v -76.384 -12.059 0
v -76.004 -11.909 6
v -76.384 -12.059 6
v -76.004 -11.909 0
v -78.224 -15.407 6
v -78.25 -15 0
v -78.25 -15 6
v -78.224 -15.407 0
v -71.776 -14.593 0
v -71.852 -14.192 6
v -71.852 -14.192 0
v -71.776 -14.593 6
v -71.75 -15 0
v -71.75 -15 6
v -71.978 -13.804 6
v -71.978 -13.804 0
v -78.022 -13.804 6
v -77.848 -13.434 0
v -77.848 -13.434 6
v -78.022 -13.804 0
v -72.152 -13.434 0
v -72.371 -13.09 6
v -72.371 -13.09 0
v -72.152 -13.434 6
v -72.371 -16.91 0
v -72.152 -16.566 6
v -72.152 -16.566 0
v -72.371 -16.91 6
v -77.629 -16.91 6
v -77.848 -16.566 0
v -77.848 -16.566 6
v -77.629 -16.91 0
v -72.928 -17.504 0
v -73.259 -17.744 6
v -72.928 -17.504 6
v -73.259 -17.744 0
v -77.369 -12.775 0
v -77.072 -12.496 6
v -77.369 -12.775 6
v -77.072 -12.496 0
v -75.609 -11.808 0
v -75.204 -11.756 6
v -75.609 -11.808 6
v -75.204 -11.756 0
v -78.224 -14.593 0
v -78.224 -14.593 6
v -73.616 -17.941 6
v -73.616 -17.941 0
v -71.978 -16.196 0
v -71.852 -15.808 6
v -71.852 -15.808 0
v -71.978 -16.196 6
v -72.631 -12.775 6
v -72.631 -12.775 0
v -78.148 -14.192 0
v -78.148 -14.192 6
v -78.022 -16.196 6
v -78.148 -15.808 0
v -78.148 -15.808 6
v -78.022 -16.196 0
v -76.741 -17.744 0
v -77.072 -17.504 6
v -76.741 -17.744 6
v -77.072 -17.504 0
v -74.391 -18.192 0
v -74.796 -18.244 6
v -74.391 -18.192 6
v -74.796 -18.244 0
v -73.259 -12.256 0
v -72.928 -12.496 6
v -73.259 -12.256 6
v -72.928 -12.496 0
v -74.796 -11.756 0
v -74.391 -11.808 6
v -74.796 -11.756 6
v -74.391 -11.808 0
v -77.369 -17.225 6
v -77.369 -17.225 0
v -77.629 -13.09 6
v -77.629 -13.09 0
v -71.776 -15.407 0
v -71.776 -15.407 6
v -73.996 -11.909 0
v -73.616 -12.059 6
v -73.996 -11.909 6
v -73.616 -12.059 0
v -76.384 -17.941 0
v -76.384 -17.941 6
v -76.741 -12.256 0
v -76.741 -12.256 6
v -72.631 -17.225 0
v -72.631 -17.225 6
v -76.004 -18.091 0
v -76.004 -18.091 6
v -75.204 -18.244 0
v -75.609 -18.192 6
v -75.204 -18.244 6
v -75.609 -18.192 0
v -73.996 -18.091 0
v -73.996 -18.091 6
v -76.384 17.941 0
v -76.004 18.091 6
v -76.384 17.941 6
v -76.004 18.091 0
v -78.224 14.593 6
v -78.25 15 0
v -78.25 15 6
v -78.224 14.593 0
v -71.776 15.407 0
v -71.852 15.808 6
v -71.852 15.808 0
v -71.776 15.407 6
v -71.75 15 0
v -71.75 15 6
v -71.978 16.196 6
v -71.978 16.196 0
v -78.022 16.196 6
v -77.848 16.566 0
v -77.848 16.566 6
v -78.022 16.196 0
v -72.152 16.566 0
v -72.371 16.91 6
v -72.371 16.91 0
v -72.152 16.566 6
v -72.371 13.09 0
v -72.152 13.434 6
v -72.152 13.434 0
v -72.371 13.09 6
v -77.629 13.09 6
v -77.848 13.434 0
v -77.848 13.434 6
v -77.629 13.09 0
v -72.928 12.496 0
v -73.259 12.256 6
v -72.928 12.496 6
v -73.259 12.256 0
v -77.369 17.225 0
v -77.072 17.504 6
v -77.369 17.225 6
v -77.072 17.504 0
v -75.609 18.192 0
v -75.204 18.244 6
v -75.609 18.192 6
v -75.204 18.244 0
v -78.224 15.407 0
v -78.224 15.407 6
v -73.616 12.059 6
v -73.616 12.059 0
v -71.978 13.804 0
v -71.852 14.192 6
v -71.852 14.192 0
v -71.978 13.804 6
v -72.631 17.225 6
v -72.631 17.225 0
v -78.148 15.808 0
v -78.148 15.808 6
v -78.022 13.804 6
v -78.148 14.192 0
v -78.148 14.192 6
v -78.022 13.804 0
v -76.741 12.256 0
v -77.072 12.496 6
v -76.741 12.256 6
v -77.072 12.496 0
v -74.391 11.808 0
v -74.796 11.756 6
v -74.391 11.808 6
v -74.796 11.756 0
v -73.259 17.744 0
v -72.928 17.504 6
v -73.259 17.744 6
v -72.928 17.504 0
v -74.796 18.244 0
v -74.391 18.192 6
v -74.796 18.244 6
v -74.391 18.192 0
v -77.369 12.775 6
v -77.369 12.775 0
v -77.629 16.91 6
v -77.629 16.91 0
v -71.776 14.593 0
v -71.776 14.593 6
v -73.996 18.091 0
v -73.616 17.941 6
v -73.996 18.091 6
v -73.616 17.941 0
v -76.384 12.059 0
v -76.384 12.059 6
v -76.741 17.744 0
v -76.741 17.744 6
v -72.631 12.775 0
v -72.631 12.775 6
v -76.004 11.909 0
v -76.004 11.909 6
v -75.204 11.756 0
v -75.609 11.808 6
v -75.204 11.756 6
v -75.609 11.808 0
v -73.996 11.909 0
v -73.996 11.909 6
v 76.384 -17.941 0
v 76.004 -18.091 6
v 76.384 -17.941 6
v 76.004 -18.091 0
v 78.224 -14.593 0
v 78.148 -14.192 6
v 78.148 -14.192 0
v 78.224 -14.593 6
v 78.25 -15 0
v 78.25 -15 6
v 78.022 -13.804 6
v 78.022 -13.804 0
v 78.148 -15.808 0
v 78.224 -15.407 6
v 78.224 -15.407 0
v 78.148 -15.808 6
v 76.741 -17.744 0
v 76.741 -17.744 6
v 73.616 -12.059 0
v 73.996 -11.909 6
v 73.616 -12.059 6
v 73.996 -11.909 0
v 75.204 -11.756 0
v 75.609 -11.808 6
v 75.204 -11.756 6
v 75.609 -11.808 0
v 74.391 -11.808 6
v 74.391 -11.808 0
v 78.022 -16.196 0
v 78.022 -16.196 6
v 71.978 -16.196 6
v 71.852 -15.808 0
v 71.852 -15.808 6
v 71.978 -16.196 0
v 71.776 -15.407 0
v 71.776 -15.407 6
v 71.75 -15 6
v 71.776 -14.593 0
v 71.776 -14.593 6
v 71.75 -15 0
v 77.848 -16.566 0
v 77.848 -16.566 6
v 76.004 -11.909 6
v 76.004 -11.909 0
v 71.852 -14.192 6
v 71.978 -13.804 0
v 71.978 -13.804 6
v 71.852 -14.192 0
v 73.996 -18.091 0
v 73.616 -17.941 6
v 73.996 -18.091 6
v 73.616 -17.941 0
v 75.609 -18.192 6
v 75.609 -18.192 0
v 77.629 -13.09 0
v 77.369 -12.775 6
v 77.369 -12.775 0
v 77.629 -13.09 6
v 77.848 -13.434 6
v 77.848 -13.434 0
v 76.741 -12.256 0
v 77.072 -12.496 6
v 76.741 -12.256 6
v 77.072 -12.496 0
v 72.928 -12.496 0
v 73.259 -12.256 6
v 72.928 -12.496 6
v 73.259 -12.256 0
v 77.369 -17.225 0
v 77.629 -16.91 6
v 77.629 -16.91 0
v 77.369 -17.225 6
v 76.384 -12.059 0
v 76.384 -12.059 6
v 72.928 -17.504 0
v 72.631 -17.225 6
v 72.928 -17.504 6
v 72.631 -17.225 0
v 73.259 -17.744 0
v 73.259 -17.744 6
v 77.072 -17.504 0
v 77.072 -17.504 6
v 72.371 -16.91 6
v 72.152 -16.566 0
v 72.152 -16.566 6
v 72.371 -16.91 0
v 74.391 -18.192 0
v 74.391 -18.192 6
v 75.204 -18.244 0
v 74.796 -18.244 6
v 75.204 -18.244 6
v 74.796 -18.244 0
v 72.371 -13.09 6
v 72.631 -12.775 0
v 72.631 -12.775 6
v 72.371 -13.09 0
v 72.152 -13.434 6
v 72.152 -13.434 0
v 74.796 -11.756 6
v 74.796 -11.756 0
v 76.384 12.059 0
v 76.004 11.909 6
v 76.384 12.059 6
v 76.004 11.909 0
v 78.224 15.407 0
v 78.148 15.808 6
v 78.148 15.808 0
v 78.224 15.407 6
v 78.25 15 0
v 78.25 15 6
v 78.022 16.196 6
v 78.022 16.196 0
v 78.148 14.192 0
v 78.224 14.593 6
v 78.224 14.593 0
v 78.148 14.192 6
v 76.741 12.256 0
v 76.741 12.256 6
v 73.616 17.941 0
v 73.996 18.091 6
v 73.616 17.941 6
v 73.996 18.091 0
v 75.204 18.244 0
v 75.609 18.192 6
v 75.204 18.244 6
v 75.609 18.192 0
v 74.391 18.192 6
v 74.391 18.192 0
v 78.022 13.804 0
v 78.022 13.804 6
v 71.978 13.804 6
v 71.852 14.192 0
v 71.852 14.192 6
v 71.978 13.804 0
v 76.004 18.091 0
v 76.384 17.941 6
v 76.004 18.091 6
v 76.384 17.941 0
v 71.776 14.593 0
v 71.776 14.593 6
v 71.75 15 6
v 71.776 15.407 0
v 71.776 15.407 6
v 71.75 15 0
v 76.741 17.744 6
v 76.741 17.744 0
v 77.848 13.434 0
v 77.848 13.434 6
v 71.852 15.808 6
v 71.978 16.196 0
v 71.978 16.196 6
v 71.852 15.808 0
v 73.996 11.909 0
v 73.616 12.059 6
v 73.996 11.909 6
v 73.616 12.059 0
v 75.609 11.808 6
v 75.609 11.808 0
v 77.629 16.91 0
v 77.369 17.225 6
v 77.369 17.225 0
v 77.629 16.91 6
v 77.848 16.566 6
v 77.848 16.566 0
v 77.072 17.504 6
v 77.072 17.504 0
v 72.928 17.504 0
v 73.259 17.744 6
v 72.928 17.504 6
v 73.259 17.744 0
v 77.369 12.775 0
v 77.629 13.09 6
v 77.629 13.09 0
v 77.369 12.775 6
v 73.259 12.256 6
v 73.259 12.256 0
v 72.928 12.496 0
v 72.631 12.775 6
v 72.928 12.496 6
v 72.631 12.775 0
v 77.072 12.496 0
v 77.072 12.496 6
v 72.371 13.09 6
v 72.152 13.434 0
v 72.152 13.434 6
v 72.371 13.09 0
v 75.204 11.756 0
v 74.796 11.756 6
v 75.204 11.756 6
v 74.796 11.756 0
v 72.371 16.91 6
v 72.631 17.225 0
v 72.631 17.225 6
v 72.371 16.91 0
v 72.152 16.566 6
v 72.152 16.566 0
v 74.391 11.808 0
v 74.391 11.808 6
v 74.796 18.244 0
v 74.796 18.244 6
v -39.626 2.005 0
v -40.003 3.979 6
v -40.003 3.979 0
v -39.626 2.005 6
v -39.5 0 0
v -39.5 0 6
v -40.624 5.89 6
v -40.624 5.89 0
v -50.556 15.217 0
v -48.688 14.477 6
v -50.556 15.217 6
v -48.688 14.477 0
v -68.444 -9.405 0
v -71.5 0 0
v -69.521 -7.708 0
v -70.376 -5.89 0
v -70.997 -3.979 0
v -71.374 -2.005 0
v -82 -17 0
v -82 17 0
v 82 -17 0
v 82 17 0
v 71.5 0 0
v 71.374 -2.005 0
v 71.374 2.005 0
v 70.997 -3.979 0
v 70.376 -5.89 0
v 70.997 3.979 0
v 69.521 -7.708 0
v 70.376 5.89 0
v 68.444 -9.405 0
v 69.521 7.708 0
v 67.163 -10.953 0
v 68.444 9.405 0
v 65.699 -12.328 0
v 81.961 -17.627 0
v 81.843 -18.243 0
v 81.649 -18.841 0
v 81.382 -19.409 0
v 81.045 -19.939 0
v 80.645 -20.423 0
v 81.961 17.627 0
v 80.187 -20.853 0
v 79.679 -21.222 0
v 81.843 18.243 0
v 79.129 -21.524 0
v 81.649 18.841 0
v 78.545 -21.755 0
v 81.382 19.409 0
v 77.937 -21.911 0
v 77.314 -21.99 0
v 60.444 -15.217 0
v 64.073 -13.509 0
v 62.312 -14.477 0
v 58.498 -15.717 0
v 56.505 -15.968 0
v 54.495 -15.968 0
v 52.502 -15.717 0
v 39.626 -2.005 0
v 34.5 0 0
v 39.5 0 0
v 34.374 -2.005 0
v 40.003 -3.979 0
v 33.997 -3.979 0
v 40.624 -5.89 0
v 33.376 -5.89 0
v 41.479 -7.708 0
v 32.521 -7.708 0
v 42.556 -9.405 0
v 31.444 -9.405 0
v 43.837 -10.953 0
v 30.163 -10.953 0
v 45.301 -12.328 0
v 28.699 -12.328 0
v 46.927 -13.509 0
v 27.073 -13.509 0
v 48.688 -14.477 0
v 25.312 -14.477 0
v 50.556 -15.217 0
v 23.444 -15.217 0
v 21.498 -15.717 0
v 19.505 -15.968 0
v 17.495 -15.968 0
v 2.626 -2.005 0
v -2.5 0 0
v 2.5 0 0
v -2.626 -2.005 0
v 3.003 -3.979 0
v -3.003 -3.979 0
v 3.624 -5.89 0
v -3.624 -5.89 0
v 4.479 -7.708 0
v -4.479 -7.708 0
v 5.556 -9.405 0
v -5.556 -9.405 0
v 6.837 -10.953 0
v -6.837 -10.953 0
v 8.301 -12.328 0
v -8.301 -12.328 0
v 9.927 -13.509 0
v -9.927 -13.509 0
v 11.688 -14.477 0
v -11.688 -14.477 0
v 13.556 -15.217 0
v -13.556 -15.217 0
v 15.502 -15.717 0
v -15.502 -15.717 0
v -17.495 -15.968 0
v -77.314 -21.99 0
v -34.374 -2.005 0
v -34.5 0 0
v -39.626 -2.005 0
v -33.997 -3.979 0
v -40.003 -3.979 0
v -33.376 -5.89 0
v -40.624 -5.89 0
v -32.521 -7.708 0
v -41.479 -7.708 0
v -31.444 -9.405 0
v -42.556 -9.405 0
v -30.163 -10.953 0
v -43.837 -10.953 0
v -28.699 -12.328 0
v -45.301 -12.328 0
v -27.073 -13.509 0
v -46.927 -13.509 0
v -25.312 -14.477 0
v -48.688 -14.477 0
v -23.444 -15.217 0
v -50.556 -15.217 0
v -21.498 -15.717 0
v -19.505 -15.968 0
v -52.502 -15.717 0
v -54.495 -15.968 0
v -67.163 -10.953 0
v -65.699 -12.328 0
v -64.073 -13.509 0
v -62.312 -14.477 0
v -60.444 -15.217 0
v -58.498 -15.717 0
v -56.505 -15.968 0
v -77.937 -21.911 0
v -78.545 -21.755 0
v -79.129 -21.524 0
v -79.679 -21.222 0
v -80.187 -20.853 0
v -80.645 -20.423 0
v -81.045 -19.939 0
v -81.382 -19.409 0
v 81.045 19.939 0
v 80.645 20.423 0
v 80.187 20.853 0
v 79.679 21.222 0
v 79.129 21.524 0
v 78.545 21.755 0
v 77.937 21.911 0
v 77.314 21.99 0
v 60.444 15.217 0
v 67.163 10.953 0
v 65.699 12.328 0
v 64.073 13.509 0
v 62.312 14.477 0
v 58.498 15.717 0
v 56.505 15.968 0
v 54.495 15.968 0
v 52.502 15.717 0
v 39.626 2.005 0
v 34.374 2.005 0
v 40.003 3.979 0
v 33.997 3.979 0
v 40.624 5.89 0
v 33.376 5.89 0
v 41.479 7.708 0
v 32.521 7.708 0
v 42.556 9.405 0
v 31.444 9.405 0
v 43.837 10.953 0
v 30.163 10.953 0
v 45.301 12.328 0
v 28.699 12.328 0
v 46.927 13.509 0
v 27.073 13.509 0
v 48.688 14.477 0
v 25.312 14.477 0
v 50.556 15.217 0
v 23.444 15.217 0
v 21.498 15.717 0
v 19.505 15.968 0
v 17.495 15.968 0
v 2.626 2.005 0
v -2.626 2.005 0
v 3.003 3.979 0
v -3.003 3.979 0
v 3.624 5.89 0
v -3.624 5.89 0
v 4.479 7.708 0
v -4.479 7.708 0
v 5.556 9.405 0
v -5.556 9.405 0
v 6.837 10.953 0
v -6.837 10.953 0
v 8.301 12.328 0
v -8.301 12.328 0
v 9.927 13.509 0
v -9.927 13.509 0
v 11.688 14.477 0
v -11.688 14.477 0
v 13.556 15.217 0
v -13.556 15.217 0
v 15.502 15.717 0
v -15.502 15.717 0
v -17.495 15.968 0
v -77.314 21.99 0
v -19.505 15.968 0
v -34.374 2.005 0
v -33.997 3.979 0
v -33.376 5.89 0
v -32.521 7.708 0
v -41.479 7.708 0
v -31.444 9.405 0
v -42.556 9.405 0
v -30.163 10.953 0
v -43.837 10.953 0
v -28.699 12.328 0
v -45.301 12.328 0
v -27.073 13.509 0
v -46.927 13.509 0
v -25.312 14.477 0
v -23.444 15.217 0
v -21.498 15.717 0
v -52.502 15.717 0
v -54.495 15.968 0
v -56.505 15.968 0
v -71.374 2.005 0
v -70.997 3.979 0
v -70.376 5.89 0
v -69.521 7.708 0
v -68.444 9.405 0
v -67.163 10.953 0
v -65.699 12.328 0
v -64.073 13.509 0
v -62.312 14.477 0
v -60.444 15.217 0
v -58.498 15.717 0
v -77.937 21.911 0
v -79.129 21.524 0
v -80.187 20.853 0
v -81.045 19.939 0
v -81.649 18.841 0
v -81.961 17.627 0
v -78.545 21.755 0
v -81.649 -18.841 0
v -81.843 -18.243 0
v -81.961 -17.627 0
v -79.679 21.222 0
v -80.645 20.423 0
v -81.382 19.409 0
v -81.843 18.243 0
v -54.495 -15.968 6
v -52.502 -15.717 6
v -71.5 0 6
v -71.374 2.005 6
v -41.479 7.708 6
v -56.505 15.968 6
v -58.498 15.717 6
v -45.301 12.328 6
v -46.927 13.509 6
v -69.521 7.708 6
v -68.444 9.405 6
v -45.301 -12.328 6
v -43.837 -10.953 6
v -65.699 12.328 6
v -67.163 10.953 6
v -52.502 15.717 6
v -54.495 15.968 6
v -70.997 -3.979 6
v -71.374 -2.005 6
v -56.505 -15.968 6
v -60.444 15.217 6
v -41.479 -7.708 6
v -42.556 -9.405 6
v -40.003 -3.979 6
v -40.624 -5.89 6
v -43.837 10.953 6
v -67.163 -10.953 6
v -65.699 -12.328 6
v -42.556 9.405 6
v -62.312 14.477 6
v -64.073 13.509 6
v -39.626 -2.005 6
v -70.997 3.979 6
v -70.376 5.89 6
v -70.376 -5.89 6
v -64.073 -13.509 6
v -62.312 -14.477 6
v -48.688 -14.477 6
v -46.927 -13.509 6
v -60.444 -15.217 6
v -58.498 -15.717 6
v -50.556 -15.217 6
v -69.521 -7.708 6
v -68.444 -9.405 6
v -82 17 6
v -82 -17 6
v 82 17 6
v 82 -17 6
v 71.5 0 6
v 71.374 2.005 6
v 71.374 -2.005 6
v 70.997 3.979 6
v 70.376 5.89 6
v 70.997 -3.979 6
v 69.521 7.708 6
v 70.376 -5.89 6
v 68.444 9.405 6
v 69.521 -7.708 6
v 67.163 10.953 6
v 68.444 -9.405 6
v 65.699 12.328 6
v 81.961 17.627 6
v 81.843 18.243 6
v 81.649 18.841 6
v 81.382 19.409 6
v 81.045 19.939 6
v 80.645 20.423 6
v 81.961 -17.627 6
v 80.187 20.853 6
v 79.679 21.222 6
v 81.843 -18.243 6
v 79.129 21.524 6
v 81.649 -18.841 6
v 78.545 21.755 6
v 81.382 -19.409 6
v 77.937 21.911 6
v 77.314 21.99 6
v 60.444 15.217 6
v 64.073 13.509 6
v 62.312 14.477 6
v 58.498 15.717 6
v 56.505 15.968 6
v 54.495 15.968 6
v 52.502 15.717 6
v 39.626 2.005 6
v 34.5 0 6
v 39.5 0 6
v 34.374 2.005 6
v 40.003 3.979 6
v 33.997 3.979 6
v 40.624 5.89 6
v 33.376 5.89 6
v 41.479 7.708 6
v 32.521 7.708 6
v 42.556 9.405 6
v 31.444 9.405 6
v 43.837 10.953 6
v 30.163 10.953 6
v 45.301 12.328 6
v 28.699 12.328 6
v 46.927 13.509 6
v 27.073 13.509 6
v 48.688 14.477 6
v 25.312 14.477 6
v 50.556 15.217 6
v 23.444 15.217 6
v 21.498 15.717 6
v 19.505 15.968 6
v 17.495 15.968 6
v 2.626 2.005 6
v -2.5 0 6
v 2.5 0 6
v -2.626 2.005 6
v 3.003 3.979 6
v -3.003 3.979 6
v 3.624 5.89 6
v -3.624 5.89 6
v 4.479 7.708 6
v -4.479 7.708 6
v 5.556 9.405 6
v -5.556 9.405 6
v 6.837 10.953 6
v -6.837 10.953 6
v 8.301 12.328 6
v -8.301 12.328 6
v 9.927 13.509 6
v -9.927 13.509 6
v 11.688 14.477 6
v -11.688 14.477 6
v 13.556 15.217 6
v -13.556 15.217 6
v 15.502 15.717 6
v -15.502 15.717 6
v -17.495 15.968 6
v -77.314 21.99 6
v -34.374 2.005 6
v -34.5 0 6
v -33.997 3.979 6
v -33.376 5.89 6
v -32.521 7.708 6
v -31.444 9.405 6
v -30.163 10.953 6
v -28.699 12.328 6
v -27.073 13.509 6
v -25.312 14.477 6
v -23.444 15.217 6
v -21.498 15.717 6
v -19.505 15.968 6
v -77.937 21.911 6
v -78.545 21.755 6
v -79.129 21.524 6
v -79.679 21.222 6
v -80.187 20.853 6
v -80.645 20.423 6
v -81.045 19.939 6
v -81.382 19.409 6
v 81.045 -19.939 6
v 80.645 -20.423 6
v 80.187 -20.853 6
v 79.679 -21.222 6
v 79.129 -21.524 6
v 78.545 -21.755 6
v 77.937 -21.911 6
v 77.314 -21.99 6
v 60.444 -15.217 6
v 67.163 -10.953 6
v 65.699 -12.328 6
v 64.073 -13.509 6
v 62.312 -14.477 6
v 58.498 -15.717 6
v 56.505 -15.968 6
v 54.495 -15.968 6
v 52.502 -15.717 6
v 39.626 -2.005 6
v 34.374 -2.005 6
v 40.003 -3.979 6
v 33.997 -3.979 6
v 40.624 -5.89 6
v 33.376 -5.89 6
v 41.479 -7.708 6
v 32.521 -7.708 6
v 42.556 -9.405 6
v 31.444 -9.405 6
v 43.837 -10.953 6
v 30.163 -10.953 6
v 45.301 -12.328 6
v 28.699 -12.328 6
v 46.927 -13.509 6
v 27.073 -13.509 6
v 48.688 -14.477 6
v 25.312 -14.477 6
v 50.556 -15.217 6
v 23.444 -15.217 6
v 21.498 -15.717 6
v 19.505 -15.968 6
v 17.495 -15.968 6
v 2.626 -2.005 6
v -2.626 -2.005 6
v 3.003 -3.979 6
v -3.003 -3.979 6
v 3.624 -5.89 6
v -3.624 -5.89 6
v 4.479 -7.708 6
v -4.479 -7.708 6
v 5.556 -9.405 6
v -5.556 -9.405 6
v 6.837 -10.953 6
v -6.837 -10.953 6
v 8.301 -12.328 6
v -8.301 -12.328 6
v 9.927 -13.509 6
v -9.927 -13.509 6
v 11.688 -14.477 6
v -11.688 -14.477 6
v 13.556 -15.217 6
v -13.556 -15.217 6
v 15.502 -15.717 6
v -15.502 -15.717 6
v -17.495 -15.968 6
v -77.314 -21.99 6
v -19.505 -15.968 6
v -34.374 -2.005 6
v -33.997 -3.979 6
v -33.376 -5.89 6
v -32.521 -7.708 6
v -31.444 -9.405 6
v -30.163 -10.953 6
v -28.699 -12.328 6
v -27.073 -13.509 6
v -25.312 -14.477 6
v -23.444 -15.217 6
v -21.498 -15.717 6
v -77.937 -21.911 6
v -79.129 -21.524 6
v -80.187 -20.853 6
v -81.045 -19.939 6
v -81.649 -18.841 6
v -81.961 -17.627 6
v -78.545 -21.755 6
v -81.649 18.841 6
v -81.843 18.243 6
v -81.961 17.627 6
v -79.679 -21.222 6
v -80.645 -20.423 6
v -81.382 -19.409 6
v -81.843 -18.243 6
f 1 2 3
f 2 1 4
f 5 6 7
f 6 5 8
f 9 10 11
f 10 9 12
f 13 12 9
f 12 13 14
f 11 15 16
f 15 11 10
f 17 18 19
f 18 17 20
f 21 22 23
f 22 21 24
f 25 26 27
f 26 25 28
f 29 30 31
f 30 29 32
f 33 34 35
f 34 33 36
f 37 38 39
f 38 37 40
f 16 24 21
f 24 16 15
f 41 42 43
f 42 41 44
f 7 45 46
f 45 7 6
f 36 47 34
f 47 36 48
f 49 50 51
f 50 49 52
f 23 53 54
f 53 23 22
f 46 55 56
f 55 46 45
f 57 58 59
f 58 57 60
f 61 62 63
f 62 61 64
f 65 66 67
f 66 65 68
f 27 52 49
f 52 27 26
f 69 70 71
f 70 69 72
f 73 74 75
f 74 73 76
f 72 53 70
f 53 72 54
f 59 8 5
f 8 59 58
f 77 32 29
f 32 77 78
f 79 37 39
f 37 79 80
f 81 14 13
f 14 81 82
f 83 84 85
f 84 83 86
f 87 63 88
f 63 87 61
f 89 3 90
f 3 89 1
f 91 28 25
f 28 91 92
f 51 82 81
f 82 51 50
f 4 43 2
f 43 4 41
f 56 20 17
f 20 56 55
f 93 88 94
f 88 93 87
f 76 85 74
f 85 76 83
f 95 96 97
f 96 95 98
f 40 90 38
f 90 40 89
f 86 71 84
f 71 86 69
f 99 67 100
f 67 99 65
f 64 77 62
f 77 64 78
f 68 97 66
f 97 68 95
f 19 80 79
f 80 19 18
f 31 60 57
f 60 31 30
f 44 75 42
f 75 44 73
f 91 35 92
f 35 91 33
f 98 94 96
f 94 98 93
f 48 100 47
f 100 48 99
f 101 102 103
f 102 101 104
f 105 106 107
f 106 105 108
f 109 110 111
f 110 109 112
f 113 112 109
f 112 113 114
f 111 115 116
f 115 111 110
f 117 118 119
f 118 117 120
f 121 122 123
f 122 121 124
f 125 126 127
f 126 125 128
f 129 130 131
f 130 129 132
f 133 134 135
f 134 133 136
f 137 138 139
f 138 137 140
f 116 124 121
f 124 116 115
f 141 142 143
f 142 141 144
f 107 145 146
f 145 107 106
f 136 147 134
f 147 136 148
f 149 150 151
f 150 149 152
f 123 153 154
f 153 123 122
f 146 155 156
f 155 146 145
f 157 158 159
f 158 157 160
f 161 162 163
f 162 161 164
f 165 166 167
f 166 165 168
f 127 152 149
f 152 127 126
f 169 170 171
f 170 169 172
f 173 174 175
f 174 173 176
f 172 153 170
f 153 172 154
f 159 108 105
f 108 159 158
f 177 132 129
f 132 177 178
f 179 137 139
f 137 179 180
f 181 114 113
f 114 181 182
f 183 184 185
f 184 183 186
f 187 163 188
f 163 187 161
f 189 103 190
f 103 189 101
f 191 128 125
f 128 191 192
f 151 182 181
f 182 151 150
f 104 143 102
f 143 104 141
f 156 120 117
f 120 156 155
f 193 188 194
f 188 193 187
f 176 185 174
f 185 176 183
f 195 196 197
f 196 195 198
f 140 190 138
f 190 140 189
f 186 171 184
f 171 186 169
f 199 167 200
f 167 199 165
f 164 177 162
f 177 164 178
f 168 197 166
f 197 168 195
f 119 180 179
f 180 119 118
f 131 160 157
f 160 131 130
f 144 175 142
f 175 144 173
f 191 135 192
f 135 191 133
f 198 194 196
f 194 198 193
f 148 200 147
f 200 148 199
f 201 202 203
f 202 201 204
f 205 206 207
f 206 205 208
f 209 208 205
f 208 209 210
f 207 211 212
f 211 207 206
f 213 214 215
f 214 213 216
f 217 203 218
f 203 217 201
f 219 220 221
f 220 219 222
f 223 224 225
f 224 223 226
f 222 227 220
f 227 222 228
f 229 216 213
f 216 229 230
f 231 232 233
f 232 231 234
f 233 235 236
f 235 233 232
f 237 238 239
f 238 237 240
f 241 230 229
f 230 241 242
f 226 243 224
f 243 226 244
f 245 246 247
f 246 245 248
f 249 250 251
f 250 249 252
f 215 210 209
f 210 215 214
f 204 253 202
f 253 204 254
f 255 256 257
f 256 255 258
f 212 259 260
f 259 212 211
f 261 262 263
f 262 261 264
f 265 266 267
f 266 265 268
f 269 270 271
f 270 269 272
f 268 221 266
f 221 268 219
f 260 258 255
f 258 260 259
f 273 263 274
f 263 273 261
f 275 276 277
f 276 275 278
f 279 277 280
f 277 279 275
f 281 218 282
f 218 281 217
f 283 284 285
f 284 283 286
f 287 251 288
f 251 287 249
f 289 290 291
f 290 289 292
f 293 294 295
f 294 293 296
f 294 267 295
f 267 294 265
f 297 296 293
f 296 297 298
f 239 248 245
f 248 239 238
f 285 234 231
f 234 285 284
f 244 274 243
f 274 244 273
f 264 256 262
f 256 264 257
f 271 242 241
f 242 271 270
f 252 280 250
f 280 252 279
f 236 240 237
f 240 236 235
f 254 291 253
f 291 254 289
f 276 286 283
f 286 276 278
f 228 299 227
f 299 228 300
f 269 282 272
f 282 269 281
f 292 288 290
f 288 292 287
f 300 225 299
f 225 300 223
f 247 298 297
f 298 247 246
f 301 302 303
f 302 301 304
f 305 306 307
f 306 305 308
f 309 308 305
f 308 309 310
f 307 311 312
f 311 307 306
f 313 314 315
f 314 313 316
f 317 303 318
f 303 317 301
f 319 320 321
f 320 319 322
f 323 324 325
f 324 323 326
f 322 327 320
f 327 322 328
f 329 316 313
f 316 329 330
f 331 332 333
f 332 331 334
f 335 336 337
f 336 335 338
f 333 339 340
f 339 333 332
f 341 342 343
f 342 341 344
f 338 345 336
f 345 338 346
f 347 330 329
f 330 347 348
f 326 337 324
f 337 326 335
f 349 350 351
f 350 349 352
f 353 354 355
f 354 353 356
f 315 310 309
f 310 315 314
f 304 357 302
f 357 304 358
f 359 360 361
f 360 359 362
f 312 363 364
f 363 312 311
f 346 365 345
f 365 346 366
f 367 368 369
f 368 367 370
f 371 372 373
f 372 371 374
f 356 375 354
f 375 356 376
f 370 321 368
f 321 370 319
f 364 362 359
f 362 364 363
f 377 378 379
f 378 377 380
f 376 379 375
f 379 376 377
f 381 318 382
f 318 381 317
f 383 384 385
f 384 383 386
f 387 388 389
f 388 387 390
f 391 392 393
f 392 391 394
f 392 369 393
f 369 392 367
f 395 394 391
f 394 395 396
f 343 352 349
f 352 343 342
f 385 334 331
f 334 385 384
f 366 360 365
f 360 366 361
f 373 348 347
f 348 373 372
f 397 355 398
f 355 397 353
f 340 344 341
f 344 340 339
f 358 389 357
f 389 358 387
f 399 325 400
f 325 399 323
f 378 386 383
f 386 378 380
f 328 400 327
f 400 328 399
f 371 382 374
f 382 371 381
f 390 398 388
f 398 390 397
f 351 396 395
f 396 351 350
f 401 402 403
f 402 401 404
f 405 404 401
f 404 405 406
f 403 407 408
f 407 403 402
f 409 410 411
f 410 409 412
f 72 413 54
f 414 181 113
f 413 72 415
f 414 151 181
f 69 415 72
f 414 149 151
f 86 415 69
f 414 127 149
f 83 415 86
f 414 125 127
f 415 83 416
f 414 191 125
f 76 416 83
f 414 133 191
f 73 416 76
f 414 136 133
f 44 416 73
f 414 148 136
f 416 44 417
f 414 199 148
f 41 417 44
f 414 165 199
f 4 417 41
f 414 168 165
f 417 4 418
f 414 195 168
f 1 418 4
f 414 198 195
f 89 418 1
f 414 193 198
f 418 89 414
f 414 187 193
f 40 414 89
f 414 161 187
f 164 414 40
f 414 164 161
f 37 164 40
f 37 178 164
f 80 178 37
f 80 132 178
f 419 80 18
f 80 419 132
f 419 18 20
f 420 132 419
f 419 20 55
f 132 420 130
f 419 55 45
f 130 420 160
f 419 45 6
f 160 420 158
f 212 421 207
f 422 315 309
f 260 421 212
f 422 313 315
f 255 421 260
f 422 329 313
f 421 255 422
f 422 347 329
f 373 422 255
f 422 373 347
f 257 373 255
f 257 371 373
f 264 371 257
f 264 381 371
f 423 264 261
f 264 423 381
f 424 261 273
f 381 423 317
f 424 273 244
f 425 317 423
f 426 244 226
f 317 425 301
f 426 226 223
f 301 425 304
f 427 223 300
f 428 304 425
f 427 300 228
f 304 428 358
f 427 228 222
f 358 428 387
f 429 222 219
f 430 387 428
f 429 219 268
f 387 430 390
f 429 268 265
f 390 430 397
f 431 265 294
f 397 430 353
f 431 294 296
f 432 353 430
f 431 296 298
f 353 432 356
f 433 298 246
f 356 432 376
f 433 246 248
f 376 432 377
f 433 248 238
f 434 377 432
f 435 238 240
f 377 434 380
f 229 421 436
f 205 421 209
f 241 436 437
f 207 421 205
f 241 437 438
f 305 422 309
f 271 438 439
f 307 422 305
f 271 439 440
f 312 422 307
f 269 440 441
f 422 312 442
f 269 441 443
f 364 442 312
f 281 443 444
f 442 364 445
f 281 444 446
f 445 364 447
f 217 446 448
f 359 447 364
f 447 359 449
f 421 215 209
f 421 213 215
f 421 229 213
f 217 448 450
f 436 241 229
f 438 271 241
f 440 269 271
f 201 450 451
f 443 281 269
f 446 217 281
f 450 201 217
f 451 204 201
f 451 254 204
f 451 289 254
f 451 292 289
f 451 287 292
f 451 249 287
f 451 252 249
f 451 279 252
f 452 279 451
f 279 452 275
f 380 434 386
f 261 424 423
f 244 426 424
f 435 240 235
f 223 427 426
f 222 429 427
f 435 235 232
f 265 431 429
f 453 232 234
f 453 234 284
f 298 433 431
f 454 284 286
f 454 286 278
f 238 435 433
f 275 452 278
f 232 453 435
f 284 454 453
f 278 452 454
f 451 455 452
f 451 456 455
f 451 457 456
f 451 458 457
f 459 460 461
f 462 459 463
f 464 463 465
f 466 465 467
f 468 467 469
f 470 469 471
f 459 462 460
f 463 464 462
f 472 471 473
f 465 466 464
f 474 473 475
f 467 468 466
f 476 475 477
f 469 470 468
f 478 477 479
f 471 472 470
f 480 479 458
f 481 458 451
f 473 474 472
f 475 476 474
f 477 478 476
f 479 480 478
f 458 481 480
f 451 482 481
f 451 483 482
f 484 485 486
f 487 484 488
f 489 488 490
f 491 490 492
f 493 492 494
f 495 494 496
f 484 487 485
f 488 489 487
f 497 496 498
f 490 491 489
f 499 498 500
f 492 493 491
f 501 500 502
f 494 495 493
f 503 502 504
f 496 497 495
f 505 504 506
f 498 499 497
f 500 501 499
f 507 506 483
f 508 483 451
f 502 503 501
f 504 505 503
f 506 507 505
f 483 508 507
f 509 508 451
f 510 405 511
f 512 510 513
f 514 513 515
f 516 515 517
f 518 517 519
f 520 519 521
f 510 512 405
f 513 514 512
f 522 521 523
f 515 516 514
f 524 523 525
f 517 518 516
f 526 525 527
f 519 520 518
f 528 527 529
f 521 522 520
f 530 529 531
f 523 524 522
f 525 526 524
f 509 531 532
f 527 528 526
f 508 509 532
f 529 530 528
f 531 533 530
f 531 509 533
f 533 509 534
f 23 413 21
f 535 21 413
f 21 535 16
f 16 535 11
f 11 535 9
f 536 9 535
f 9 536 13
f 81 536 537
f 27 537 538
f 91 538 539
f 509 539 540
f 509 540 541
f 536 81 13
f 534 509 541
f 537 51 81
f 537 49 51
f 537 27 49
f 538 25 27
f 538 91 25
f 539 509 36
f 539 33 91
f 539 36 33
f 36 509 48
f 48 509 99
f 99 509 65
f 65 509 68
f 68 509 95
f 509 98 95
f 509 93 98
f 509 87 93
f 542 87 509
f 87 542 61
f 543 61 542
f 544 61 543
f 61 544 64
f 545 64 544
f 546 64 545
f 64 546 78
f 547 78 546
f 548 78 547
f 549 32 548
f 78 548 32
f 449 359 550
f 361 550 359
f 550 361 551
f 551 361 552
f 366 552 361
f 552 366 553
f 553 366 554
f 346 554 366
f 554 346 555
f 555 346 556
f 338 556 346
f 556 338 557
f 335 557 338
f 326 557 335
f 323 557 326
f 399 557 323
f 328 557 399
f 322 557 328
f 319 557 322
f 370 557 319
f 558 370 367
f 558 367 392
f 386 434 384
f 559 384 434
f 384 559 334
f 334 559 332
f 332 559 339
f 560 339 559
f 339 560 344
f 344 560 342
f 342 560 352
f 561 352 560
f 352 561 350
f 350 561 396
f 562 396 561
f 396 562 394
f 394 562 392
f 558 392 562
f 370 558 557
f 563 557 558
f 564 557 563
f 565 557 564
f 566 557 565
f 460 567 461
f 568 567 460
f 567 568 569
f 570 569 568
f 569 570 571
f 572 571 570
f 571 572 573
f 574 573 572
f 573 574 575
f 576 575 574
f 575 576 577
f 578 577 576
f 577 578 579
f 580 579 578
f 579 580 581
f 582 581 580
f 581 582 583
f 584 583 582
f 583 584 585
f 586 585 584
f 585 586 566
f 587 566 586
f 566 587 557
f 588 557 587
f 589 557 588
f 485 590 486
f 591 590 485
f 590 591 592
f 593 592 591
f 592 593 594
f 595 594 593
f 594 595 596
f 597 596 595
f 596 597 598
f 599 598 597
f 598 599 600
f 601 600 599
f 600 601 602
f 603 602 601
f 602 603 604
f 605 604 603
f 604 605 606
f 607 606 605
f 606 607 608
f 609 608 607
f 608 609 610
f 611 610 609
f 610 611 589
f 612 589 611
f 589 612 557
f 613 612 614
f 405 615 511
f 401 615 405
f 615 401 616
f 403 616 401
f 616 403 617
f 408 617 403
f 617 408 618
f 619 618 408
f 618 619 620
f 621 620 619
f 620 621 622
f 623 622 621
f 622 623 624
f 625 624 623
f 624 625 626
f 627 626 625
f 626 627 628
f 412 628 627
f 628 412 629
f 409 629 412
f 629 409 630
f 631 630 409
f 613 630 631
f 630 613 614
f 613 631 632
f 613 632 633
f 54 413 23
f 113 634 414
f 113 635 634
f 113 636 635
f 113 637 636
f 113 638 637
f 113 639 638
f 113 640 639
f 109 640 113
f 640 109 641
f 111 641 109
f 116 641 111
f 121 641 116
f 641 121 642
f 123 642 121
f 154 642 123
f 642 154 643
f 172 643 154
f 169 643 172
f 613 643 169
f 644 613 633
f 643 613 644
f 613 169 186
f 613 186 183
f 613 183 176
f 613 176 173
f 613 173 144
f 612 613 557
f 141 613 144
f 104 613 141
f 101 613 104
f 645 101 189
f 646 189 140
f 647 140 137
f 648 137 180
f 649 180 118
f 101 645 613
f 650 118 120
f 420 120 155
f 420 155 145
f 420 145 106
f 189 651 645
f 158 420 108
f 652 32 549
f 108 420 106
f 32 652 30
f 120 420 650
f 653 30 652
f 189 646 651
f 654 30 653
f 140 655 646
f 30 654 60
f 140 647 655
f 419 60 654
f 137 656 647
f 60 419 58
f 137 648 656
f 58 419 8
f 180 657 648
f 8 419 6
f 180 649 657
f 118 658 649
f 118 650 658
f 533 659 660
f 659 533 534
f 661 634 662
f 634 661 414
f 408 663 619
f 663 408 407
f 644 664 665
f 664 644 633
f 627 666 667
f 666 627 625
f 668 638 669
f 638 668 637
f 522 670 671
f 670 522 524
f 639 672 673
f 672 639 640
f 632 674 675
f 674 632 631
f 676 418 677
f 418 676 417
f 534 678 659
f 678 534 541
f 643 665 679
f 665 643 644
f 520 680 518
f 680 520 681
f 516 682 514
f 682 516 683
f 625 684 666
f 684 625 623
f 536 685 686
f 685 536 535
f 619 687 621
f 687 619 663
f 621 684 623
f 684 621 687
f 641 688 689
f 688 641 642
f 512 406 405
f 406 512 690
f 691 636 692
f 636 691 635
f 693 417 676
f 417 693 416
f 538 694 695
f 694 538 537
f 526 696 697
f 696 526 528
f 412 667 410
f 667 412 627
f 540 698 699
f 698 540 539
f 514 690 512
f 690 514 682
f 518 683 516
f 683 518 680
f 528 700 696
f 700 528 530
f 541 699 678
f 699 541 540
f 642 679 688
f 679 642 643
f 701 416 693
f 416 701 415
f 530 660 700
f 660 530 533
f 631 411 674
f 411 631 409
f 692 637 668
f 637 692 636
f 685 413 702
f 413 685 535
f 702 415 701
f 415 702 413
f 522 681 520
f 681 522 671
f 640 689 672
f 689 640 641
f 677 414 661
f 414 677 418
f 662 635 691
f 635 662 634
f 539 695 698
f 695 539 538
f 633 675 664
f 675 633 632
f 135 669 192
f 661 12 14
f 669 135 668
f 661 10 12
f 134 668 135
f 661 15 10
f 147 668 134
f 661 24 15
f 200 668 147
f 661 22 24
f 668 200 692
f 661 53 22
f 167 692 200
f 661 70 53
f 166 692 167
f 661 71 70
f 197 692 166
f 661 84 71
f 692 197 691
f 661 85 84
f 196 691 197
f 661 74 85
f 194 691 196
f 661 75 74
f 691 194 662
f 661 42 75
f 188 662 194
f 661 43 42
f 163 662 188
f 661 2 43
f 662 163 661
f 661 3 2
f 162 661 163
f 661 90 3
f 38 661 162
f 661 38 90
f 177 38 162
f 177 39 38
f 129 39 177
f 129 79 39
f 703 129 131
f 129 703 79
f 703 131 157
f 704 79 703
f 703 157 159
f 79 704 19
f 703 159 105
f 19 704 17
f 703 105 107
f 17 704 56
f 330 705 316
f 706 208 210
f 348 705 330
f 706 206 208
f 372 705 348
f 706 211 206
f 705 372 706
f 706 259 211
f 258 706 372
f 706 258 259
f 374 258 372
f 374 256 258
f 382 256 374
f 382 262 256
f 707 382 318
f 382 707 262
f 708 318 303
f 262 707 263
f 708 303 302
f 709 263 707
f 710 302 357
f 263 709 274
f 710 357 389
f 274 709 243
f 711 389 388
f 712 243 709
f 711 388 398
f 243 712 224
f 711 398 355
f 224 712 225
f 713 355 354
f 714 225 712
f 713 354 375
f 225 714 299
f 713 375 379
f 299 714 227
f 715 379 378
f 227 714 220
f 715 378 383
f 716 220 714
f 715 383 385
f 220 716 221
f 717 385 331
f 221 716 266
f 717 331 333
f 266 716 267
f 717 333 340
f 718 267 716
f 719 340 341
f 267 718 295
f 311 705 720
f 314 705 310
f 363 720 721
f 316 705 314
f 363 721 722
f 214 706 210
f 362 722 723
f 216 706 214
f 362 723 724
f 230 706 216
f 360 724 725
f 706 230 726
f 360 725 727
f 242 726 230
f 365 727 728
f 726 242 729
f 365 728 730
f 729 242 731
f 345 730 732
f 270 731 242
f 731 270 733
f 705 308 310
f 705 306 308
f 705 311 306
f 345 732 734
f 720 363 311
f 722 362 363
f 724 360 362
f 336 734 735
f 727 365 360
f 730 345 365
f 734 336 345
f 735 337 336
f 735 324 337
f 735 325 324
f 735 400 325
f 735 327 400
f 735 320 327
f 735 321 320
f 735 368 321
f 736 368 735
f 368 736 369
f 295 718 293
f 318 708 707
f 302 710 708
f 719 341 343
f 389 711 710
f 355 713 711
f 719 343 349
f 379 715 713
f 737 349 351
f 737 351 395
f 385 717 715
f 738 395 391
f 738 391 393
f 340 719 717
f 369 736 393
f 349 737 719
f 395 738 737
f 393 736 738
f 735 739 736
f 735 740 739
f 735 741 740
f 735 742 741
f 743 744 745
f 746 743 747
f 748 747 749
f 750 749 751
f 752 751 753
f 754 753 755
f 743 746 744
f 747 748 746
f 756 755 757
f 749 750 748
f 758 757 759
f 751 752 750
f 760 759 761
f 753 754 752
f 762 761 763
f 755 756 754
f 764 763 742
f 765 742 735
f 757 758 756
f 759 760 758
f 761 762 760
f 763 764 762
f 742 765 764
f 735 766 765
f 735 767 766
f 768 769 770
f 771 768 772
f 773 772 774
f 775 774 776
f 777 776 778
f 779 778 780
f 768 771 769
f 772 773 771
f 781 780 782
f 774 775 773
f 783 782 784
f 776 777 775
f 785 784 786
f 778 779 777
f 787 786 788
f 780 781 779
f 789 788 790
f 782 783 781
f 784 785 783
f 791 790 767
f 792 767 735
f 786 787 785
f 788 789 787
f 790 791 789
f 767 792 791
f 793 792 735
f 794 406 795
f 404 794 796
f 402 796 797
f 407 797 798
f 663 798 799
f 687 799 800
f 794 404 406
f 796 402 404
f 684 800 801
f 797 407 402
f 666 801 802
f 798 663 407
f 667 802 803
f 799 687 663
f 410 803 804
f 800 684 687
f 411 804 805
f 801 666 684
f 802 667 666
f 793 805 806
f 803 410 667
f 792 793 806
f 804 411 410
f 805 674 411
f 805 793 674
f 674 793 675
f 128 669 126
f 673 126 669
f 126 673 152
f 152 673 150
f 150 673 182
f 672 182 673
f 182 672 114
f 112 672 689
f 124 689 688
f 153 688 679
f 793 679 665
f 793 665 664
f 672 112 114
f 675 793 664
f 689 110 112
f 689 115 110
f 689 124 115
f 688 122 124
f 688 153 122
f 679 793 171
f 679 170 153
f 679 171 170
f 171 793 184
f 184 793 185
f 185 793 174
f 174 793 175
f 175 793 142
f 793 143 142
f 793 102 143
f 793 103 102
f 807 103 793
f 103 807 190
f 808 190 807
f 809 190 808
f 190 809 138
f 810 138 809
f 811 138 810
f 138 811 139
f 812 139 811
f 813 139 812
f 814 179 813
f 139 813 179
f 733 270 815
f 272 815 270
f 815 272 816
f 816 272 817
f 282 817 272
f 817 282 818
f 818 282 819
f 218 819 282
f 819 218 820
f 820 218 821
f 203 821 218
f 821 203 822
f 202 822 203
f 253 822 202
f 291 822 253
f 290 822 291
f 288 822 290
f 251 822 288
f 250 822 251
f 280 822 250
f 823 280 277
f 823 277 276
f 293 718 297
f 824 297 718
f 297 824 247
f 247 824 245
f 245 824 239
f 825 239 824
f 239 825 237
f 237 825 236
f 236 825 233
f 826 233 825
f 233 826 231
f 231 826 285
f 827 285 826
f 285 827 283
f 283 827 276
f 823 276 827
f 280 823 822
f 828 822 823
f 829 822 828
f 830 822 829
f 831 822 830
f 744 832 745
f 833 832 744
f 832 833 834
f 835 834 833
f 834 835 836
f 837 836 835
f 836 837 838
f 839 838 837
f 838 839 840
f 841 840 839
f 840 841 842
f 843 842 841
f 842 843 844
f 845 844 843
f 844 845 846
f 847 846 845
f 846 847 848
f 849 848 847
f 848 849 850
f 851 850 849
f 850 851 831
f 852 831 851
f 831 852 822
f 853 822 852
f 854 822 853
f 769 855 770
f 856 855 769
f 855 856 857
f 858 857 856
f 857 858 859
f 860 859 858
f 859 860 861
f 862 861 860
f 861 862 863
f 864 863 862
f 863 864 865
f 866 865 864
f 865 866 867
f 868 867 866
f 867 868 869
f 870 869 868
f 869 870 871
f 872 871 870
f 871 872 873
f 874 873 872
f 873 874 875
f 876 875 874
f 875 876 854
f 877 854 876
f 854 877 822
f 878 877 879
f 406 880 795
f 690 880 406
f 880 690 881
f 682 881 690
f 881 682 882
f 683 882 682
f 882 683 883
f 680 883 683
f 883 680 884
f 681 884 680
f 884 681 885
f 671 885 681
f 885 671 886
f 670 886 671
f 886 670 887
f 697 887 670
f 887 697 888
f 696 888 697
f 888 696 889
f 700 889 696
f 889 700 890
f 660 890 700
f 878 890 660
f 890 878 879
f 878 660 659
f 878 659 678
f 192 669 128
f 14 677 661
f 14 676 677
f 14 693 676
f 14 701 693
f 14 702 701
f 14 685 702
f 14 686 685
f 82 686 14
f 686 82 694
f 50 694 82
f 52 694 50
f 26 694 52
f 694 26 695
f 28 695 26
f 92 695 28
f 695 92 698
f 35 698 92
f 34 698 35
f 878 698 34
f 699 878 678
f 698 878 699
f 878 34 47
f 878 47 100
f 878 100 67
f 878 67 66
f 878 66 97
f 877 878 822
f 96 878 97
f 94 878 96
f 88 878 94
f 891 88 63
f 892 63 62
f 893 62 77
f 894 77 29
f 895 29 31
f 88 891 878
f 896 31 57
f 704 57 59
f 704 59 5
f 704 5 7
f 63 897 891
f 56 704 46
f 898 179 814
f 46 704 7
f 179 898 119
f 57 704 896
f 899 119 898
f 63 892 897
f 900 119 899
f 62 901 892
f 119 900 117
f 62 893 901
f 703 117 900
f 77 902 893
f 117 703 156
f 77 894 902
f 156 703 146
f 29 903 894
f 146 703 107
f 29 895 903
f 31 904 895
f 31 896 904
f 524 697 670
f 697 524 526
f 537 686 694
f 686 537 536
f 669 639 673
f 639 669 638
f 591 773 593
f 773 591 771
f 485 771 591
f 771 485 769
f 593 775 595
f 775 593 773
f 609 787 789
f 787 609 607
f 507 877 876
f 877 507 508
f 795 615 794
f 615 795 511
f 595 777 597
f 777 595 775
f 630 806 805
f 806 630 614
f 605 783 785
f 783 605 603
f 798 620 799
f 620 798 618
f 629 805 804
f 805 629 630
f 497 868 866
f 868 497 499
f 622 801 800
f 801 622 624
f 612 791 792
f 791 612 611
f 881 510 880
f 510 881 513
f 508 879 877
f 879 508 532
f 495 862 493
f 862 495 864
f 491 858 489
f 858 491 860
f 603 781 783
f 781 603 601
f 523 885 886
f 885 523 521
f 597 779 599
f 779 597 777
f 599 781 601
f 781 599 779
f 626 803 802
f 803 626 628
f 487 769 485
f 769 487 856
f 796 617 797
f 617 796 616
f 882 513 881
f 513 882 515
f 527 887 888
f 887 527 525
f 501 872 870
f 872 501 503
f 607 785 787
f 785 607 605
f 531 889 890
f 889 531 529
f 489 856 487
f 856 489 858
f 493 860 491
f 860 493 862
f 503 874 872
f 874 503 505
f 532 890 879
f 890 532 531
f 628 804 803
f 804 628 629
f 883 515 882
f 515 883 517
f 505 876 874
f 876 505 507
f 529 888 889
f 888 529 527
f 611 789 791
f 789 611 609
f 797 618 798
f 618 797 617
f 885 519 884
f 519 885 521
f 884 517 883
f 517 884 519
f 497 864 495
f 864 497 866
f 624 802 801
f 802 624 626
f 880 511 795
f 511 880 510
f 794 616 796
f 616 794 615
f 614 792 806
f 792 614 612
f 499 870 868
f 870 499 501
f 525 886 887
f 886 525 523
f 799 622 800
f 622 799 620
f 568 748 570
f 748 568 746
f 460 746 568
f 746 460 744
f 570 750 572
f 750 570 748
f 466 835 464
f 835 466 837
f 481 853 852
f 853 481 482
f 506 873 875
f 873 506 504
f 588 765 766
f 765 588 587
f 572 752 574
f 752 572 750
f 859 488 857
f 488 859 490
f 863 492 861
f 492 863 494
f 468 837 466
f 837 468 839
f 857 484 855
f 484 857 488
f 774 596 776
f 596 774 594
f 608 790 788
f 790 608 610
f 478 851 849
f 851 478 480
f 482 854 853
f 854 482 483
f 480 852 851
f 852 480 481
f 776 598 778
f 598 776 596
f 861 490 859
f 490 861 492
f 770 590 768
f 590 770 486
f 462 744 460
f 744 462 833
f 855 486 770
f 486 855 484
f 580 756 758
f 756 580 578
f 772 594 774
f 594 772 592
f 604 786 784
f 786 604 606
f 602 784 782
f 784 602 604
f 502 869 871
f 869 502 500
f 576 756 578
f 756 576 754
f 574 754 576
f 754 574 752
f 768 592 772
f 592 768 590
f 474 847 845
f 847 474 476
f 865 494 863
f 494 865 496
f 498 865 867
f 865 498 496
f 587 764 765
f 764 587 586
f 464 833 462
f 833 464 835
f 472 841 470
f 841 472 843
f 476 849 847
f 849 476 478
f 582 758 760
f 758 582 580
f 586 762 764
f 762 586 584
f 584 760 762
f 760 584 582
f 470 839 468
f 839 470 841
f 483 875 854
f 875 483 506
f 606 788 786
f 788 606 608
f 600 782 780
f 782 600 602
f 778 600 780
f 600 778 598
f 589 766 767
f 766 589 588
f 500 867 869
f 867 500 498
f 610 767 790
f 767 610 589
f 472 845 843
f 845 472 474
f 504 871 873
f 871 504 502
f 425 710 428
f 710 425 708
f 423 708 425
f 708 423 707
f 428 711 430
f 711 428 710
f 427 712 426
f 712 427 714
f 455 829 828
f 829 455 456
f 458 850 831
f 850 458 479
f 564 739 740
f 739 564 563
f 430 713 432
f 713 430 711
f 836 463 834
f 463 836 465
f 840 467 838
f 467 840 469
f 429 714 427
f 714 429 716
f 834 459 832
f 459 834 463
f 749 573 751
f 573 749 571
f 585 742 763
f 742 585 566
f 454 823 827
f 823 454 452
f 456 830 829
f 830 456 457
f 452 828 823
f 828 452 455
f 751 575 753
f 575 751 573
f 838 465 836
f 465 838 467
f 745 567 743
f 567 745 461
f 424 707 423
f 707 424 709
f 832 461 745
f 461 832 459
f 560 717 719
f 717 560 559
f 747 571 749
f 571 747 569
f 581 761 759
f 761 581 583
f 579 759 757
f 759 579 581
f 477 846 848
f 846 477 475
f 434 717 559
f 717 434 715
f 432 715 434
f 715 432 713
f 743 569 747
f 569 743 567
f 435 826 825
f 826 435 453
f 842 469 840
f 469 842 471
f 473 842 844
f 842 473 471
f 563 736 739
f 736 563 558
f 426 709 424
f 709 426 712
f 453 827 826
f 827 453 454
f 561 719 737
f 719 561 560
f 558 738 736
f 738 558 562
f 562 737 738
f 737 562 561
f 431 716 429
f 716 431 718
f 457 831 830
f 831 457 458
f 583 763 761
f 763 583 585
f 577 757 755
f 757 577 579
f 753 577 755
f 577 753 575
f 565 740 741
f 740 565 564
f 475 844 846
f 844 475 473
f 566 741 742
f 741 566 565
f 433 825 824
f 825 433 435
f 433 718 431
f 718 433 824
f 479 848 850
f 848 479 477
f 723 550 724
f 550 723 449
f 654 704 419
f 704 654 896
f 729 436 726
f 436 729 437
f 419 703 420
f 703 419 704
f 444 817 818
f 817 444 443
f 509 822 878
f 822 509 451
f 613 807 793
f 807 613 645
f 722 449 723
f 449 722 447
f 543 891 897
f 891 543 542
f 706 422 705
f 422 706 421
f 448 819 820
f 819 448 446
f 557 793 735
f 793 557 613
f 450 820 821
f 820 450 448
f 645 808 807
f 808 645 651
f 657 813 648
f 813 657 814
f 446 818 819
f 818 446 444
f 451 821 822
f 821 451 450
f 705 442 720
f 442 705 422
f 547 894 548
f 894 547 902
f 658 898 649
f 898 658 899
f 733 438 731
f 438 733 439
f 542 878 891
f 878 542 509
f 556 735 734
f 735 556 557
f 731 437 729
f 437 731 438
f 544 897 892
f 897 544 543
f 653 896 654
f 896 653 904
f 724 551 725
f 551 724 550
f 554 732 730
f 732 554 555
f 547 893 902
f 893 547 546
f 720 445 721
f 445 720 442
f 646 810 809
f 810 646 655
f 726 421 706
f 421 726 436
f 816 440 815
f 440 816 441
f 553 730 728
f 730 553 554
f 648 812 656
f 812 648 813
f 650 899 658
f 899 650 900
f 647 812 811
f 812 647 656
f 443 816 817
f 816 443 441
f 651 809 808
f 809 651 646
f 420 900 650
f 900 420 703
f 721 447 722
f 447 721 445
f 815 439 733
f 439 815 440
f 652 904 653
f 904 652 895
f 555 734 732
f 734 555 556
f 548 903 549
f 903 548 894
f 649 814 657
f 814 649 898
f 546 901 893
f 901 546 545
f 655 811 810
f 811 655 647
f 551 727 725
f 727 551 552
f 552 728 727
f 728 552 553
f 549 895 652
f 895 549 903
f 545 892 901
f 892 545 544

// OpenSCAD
$fn = 50;


difference() {
	union() {
		hull() {
			translate(v = [-77.0000000000, 17.0000000000, 0]) {
				cylinder(h = 6, r = 5);
			}
			translate(v = [77.0000000000, 17.0000000000, 0]) {
				cylinder(h = 6, r = 5);
			}
			translate(v = [-77.0000000000, -17.0000000000, 0]) {
				cylinder(h = 6, r = 5);
			}
			translate(v = [77.0000000000, -17.0000000000, 0]) {
				cylinder(h = 6, r = 5);
			}
		}
	}
	union() {
		#translate(v = [-75.0000000000, -15.0000000000, -100.0000000000]) {
			cylinder(h = 200, r = 3.2500000000);
		}
		#translate(v = [-75.0000000000, 15.0000000000, -100.0000000000]) {
			cylinder(h = 200, r = 3.2500000000);
		}
		#translate(v = [75.0000000000, -15.0000000000, -100.0000000000]) {
			cylinder(h = 200, r = 3.2500000000);
		}
		#translate(v = [75.0000000000, 15.0000000000, -100.0000000000]) {
			cylinder(h = 200, r = 3.2500000000);
		}
		#translate(v = [-55.5000000000, 0, 0]) {
			cylinder(h = 6, r = 16.0000000000);
		}
		#translate(v = [-18.5000000000, 0, 0]) {
			cylinder(h = 6, r = 16.0000000000);
		}
		#translate(v = [18.5000000000, 0, 0]) {
			cylinder(h = 6, r = 16.0000000000);
		}
		#translate(v = [55.5000000000, 0, 0]) {
			cylinder(h = 6, r = 16.0000000000);
		}
	}
}
